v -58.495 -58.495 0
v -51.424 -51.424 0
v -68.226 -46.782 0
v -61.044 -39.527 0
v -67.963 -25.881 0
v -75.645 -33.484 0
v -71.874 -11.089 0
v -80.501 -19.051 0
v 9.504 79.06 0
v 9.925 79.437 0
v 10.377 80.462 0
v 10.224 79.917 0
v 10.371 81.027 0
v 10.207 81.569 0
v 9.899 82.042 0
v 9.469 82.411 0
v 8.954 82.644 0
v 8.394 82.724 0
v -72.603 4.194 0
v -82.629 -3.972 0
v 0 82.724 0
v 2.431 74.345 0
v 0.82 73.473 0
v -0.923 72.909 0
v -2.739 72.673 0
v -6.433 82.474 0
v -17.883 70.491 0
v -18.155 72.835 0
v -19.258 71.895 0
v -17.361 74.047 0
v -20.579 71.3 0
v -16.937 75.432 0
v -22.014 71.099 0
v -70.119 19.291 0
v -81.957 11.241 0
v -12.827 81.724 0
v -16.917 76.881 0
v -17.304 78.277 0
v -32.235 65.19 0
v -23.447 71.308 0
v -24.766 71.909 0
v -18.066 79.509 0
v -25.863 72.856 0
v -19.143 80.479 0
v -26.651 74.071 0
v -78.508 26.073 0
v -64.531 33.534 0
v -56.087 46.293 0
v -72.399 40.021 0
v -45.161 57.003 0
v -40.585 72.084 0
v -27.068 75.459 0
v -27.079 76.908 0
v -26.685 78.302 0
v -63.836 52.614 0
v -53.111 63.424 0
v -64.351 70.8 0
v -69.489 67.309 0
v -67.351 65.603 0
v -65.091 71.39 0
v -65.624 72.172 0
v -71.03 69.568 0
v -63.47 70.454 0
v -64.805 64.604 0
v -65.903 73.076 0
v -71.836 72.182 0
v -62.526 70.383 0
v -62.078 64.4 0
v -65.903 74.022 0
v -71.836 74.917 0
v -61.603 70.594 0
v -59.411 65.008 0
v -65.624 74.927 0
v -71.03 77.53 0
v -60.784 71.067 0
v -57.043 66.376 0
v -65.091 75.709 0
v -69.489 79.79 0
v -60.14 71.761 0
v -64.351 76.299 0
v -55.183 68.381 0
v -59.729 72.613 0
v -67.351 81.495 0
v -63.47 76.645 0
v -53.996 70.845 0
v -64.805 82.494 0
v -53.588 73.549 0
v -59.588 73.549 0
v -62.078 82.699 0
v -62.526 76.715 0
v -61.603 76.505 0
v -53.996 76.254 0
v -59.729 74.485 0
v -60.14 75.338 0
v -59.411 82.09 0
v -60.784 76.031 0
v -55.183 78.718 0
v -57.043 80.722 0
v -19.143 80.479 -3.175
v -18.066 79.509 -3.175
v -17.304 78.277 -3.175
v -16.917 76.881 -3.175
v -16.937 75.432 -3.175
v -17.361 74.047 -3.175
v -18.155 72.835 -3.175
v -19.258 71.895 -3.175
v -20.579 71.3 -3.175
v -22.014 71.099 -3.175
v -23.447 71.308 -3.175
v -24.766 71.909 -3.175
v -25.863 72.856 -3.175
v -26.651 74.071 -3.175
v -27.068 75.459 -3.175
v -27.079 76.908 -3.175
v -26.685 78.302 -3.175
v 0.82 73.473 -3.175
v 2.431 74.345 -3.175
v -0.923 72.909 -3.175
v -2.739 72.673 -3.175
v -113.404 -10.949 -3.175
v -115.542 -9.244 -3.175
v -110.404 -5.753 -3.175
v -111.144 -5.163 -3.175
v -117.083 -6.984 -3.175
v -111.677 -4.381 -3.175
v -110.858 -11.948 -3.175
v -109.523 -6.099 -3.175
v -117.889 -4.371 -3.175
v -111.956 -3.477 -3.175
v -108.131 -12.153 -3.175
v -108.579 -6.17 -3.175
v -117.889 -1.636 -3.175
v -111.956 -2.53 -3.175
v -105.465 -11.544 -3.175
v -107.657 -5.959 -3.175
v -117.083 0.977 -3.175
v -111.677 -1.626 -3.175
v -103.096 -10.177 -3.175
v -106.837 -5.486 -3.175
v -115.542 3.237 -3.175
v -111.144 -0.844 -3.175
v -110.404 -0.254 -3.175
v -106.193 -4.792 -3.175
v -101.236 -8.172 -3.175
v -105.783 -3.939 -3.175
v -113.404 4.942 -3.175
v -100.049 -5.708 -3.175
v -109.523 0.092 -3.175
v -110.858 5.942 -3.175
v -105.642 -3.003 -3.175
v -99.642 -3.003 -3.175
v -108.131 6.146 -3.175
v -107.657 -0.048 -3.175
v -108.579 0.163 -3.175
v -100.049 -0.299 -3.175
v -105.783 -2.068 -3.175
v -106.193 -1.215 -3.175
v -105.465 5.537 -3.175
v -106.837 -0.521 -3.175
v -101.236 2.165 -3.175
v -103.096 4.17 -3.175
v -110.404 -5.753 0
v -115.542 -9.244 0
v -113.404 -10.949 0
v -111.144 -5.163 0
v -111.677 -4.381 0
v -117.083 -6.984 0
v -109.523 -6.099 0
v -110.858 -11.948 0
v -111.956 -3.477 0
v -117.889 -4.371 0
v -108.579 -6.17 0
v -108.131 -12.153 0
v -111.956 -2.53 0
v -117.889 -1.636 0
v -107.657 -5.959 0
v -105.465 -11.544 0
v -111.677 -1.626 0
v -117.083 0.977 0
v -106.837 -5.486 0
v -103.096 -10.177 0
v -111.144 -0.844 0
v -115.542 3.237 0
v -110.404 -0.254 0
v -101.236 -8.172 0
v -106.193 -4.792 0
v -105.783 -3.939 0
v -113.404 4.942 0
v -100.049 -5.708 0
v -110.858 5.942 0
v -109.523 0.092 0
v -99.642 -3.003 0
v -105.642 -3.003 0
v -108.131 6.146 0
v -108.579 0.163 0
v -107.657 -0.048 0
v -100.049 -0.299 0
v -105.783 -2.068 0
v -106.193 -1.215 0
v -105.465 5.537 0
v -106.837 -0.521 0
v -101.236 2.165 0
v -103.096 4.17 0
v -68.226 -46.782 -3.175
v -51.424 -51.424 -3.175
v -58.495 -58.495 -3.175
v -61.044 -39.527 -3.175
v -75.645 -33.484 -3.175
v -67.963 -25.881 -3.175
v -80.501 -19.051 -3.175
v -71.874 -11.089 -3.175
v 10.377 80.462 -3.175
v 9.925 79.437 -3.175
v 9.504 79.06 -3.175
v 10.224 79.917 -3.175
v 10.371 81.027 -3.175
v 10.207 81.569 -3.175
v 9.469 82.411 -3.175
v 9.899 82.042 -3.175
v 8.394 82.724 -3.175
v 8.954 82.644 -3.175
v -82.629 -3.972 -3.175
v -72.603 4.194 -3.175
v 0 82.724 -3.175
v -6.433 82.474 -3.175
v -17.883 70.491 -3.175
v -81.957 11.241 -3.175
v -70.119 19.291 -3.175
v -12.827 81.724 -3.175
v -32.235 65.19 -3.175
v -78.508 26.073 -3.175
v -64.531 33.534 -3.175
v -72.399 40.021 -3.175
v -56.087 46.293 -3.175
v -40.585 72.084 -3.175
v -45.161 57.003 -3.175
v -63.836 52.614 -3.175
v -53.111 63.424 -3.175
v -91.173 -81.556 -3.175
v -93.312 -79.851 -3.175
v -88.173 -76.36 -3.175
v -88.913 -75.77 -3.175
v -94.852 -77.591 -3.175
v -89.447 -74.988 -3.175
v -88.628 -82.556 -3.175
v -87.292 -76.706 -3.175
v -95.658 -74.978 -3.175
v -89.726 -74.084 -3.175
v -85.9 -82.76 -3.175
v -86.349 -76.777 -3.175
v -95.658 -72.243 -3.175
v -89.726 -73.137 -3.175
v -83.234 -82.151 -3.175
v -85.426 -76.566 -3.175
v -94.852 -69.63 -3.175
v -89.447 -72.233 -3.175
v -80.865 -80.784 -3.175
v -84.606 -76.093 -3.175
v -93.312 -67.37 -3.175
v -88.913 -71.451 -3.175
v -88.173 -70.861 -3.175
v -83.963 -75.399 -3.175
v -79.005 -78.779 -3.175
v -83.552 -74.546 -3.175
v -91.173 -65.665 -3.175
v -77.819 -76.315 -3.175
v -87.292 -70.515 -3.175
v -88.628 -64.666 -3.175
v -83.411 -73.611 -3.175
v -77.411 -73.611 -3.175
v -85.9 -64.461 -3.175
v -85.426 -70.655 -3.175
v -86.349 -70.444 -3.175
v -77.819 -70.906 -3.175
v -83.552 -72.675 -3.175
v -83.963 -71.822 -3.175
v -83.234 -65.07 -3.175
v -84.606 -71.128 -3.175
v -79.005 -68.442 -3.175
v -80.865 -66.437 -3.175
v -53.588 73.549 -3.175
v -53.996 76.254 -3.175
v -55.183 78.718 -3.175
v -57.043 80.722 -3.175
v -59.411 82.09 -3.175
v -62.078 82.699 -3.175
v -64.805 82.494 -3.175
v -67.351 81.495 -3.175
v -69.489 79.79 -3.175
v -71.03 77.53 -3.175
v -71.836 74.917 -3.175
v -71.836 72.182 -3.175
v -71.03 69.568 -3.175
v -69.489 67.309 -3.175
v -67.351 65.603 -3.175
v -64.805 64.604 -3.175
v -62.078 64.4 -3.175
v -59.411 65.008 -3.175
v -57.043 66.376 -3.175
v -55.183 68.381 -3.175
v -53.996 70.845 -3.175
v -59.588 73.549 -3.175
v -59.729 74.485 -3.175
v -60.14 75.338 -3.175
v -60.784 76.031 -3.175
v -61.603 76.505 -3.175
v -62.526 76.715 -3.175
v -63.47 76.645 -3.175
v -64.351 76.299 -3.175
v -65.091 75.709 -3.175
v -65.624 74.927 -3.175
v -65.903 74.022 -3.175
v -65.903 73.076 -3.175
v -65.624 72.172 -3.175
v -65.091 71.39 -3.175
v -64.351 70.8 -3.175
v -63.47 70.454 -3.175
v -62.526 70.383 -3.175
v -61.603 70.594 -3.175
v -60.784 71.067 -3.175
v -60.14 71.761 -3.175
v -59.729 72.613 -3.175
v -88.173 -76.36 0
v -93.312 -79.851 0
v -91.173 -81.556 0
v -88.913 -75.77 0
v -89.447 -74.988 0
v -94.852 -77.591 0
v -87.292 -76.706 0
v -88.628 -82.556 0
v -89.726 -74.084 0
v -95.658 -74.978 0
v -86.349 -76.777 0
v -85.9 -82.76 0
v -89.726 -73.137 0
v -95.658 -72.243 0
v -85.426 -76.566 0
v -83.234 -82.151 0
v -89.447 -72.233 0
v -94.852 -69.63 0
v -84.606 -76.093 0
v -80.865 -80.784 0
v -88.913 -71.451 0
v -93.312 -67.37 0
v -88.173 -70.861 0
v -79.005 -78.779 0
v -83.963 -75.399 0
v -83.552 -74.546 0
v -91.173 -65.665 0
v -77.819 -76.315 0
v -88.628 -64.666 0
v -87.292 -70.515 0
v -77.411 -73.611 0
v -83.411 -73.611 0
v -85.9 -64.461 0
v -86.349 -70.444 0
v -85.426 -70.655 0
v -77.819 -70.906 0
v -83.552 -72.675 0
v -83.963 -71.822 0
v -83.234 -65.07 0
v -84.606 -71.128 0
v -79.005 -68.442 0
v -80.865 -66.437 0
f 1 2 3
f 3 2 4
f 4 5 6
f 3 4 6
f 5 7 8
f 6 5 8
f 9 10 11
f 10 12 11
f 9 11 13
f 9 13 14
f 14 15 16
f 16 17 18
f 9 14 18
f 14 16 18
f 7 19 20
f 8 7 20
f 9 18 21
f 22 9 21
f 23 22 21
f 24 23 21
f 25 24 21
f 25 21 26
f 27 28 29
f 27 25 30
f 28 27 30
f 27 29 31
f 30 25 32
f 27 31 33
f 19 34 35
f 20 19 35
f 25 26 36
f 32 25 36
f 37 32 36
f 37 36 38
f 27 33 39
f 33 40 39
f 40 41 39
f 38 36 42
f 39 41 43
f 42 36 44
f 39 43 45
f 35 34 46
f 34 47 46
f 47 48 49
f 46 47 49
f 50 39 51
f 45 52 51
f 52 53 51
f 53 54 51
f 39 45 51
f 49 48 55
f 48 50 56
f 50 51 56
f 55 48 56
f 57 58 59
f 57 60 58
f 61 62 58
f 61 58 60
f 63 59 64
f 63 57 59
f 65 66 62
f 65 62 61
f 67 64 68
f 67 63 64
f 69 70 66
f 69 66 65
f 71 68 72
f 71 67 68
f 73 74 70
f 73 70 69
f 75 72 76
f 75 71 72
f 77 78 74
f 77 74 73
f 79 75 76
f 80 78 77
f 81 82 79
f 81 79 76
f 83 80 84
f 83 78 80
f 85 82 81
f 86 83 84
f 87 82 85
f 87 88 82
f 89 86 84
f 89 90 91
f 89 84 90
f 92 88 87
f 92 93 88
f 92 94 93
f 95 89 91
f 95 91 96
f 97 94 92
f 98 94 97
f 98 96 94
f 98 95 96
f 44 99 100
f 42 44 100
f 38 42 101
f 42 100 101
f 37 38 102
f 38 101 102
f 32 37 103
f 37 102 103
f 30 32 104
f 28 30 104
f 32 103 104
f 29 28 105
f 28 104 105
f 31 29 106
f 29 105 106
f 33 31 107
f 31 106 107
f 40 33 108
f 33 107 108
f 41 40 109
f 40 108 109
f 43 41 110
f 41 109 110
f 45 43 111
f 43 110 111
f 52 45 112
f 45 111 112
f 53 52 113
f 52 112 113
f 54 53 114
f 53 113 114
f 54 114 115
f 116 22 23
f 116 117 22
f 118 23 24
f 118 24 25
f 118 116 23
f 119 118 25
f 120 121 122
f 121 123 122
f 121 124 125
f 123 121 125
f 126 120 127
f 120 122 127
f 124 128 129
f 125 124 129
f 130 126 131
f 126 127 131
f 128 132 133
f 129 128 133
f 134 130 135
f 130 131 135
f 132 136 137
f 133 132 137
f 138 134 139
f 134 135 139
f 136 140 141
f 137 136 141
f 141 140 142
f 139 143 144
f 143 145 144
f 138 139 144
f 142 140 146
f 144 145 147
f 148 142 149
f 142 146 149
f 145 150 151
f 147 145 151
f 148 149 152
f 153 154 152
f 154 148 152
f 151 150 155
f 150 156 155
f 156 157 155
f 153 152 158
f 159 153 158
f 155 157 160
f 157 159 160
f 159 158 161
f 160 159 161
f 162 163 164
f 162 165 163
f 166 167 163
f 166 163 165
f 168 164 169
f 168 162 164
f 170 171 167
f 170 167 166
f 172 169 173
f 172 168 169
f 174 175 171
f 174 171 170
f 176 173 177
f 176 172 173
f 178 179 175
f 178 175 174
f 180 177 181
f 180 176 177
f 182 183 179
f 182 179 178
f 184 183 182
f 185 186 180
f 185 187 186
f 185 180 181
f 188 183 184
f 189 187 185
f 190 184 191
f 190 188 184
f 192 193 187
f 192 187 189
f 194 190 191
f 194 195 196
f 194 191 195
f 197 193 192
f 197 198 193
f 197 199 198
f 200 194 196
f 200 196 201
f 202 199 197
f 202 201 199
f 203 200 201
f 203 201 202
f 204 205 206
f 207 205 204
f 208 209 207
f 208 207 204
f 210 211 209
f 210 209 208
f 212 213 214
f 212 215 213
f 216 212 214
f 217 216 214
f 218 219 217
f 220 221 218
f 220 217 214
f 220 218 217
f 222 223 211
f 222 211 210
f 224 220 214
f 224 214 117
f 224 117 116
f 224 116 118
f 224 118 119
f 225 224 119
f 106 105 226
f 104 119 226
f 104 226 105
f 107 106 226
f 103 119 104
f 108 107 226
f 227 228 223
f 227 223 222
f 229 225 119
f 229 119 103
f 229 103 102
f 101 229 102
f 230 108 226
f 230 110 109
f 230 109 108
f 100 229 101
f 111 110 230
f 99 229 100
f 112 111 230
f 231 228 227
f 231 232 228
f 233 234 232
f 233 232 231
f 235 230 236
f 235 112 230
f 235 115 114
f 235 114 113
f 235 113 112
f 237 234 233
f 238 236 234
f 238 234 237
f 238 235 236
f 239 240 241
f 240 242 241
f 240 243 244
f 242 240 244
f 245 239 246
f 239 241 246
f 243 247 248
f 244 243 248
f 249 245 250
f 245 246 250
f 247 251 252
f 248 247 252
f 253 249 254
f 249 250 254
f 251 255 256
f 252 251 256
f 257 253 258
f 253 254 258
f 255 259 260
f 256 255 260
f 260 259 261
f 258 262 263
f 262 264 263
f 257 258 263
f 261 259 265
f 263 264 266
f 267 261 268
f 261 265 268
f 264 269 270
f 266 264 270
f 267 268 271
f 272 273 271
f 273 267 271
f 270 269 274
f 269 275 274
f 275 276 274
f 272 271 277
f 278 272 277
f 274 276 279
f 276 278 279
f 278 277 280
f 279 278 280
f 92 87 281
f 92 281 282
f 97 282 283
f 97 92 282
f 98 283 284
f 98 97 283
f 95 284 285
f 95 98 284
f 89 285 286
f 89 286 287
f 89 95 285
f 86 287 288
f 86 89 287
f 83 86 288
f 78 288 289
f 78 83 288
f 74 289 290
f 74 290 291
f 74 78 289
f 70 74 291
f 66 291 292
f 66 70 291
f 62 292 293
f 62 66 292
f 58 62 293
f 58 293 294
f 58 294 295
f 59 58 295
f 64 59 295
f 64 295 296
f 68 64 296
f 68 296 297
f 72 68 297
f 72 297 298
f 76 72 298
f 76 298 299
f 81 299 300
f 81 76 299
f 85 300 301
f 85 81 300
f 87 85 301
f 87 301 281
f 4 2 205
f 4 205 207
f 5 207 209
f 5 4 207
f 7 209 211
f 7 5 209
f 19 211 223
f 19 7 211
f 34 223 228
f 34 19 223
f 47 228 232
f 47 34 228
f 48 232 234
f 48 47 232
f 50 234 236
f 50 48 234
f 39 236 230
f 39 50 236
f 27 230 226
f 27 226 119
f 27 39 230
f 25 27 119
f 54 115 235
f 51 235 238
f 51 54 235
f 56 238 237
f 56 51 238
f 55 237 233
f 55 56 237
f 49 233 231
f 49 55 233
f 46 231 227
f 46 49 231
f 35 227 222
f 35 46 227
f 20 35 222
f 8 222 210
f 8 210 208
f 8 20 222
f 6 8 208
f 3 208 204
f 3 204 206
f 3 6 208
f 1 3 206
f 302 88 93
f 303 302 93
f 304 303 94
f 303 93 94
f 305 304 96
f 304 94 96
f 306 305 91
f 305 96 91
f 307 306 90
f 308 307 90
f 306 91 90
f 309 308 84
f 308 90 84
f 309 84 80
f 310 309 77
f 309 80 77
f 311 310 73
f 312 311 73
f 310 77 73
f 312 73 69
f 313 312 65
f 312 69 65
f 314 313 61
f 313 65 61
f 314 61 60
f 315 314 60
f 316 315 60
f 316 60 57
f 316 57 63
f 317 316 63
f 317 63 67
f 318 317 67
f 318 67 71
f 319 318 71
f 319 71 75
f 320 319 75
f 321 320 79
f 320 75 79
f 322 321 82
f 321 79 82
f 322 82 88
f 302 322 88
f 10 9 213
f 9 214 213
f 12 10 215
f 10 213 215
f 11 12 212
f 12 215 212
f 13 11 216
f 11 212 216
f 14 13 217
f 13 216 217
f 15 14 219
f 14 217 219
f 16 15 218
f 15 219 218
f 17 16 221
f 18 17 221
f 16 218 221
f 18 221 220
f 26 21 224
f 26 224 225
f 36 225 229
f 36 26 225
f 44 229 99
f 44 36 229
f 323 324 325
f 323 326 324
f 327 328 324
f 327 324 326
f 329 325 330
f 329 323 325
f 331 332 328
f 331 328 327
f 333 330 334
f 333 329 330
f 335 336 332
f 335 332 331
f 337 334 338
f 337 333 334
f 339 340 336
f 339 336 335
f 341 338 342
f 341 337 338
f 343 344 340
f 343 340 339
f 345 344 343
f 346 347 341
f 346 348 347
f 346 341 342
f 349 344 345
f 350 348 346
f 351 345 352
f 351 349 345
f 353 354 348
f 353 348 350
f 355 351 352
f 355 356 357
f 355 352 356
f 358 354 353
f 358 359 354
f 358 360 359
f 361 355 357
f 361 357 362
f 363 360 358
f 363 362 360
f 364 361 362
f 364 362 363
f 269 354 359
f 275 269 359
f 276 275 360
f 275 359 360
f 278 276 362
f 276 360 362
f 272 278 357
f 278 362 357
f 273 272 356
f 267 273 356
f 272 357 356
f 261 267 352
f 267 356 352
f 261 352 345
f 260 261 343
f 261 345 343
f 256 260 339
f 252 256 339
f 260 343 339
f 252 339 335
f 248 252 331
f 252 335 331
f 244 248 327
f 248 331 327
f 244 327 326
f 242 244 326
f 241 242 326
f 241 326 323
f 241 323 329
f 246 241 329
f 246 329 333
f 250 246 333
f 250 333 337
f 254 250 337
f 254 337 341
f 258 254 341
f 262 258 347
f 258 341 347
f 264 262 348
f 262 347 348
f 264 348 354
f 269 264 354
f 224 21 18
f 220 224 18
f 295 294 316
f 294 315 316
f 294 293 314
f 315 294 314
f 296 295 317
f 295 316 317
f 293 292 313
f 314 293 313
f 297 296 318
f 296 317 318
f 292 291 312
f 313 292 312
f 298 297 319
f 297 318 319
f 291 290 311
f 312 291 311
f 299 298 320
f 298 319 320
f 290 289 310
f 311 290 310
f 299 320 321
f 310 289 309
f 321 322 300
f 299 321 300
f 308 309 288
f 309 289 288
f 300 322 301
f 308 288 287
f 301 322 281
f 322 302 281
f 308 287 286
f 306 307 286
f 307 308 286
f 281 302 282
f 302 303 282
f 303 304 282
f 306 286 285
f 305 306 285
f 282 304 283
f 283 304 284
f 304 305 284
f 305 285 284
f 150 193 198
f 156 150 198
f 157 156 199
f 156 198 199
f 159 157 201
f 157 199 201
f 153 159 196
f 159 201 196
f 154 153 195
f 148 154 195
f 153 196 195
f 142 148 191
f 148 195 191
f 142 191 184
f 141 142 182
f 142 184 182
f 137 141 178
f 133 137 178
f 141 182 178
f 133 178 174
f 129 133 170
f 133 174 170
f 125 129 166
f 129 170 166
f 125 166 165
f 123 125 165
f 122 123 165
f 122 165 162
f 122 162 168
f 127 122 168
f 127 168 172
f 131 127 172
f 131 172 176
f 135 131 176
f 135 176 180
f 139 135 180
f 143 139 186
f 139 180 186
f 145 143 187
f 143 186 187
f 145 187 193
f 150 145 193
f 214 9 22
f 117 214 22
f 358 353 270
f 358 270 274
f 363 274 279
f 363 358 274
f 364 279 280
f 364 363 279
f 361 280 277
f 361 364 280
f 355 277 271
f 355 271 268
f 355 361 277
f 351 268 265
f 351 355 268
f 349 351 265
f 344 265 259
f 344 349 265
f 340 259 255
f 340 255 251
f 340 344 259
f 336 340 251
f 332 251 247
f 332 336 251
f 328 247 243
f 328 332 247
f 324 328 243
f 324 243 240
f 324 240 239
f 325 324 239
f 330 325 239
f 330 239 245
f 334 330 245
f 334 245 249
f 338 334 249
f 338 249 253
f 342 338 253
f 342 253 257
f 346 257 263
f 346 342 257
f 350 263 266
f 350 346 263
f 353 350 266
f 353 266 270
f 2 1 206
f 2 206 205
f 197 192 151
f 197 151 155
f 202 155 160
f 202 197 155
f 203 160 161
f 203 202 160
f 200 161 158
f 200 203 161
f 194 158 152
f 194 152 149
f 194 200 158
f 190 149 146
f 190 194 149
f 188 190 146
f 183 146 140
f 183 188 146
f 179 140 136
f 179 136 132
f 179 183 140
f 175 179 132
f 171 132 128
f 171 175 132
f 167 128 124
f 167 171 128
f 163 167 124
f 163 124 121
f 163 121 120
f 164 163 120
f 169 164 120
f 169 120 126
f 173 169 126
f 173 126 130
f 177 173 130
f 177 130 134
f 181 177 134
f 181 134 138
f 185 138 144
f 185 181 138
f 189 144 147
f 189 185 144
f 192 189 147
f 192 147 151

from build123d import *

# Parameters (mm, degrees)
BOSS_EXTRUDE1_DEPTH   = 3.175
SKETCH1_R             = 9.175
SKETCH1_R_2           = 3.175
BOSS_EXTRUDE1_2_DEPTH = 3.175
BOSS_EXTRUDE1_3_DEPTH = 3.175
BOSS_EXTRUDE1_4_DEPTH = 3.175
SKETCH3_R             = 5.125
CUT_EXTRUDE1_DEPTH    = 10
BOSS_EXTRUDE2_DEPTH   = 3.175
FILLET1_R             = 10
FILLET2_R             = 2


with BuildPart() as part:
    # Sketch1 → Boss-Extrude1 (new body)
    with BuildSketch(Plane.XY):
        with BuildLine():
            ThreePointArc((-51.423758408, -51.423758408), (-67.188378251, 27.830337505), (0, 72.724176569))
            Line((0, 72.724176569), (0, 82.724176569))
            ThreePointArc((0, 82.724176569), (-76.427173576, 31.657171829), (-58.49482622, -58.49482622))
            Line((-58.49482622, -58.49482622), (-51.423758408, -51.423758408))
        make_face()
    extrude(amount=-BOSS_EXTRUDE1_DEPTH)

    # Sketch3 → Cut-Extrude1 (cut)
    with BuildSketch(Plane(origin=(0, 0, -3.175), x_dir=(-1, 0, 0), z_dir=(0, 0, -1))):
        with Locations((22, 76.224176569)):
            Circle(SKETCH3_R)
    extrude(amount=-CUT_EXTRUDE1_DEPTH, mode=Mode.SUBTRACT)

    # Sketch4 → Boss-Extrude2 (add)
    with BuildSketch(Plane.XY):
        Polygon((0, 82.724176569), (15, 82.724176569), (0, 72.724176569), align=None)
    extrude(amount=-BOSS_EXTRUDE2_DEPTH)

    # Fillet1
    fillet1_edges = [part.edges().sort_by_distance(p)[0] for p in [
        (0, 72.724176569, -1.5875),
    ]]
    fillet(fillet1_edges, radius=FILLET1_R)

    # Fillet2
    fillet2_edges = [part.edges().sort_by_distance(p)[0] for p in [
        (15, 82.724176569, -1.5875),
    ]]
    fillet(fillet2_edges, radius=FILLET2_R)


with BuildPart() as body_2:
    # Sketch1 → Boss-Extrude1 2 (new body)
    with BuildSketch(Plane.XY):
        with Locations((-86.585964118, -73.610554684)):
            Circle(SKETCH1_R)
        with Locations((-86.585964118, -73.610554684)):
            Circle(SKETCH1_R_2, mode=Mode.SUBTRACT)
    extrude(amount=-BOSS_EXTRUDE1_2_DEPTH)


with BuildPart() as body_3:
    # Sketch1 → Boss-Extrude1 3 (new body)
    with BuildSketch(Plane.XY):
        with Locations((-62.763254538, 73.549176569)):
            Circle(SKETCH1_R)
        with Locations((-62.763254538, 73.549176569)):
            Circle(SKETCH1_R_2, mode=Mode.SUBTRACT)
    extrude(amount=-BOSS_EXTRUDE1_3_DEPTH)


with BuildPart() as body_4:
    # Sketch1 → Boss-Extrude1 4 (new body)
    with BuildSketch(Plane.XY):
        with Locations((-108.816589821, -3.003434316)):
            Circle(SKETCH1_R)
        with Locations((-108.816589821, -3.003434316)):
            Circle(SKETCH1_R_2, mode=Mode.SUBTRACT)
    extrude(amount=-BOSS_EXTRUDE1_4_DEPTH)


solid = Compound([part.part, body_2.part, body_3.part, body_4.part])
